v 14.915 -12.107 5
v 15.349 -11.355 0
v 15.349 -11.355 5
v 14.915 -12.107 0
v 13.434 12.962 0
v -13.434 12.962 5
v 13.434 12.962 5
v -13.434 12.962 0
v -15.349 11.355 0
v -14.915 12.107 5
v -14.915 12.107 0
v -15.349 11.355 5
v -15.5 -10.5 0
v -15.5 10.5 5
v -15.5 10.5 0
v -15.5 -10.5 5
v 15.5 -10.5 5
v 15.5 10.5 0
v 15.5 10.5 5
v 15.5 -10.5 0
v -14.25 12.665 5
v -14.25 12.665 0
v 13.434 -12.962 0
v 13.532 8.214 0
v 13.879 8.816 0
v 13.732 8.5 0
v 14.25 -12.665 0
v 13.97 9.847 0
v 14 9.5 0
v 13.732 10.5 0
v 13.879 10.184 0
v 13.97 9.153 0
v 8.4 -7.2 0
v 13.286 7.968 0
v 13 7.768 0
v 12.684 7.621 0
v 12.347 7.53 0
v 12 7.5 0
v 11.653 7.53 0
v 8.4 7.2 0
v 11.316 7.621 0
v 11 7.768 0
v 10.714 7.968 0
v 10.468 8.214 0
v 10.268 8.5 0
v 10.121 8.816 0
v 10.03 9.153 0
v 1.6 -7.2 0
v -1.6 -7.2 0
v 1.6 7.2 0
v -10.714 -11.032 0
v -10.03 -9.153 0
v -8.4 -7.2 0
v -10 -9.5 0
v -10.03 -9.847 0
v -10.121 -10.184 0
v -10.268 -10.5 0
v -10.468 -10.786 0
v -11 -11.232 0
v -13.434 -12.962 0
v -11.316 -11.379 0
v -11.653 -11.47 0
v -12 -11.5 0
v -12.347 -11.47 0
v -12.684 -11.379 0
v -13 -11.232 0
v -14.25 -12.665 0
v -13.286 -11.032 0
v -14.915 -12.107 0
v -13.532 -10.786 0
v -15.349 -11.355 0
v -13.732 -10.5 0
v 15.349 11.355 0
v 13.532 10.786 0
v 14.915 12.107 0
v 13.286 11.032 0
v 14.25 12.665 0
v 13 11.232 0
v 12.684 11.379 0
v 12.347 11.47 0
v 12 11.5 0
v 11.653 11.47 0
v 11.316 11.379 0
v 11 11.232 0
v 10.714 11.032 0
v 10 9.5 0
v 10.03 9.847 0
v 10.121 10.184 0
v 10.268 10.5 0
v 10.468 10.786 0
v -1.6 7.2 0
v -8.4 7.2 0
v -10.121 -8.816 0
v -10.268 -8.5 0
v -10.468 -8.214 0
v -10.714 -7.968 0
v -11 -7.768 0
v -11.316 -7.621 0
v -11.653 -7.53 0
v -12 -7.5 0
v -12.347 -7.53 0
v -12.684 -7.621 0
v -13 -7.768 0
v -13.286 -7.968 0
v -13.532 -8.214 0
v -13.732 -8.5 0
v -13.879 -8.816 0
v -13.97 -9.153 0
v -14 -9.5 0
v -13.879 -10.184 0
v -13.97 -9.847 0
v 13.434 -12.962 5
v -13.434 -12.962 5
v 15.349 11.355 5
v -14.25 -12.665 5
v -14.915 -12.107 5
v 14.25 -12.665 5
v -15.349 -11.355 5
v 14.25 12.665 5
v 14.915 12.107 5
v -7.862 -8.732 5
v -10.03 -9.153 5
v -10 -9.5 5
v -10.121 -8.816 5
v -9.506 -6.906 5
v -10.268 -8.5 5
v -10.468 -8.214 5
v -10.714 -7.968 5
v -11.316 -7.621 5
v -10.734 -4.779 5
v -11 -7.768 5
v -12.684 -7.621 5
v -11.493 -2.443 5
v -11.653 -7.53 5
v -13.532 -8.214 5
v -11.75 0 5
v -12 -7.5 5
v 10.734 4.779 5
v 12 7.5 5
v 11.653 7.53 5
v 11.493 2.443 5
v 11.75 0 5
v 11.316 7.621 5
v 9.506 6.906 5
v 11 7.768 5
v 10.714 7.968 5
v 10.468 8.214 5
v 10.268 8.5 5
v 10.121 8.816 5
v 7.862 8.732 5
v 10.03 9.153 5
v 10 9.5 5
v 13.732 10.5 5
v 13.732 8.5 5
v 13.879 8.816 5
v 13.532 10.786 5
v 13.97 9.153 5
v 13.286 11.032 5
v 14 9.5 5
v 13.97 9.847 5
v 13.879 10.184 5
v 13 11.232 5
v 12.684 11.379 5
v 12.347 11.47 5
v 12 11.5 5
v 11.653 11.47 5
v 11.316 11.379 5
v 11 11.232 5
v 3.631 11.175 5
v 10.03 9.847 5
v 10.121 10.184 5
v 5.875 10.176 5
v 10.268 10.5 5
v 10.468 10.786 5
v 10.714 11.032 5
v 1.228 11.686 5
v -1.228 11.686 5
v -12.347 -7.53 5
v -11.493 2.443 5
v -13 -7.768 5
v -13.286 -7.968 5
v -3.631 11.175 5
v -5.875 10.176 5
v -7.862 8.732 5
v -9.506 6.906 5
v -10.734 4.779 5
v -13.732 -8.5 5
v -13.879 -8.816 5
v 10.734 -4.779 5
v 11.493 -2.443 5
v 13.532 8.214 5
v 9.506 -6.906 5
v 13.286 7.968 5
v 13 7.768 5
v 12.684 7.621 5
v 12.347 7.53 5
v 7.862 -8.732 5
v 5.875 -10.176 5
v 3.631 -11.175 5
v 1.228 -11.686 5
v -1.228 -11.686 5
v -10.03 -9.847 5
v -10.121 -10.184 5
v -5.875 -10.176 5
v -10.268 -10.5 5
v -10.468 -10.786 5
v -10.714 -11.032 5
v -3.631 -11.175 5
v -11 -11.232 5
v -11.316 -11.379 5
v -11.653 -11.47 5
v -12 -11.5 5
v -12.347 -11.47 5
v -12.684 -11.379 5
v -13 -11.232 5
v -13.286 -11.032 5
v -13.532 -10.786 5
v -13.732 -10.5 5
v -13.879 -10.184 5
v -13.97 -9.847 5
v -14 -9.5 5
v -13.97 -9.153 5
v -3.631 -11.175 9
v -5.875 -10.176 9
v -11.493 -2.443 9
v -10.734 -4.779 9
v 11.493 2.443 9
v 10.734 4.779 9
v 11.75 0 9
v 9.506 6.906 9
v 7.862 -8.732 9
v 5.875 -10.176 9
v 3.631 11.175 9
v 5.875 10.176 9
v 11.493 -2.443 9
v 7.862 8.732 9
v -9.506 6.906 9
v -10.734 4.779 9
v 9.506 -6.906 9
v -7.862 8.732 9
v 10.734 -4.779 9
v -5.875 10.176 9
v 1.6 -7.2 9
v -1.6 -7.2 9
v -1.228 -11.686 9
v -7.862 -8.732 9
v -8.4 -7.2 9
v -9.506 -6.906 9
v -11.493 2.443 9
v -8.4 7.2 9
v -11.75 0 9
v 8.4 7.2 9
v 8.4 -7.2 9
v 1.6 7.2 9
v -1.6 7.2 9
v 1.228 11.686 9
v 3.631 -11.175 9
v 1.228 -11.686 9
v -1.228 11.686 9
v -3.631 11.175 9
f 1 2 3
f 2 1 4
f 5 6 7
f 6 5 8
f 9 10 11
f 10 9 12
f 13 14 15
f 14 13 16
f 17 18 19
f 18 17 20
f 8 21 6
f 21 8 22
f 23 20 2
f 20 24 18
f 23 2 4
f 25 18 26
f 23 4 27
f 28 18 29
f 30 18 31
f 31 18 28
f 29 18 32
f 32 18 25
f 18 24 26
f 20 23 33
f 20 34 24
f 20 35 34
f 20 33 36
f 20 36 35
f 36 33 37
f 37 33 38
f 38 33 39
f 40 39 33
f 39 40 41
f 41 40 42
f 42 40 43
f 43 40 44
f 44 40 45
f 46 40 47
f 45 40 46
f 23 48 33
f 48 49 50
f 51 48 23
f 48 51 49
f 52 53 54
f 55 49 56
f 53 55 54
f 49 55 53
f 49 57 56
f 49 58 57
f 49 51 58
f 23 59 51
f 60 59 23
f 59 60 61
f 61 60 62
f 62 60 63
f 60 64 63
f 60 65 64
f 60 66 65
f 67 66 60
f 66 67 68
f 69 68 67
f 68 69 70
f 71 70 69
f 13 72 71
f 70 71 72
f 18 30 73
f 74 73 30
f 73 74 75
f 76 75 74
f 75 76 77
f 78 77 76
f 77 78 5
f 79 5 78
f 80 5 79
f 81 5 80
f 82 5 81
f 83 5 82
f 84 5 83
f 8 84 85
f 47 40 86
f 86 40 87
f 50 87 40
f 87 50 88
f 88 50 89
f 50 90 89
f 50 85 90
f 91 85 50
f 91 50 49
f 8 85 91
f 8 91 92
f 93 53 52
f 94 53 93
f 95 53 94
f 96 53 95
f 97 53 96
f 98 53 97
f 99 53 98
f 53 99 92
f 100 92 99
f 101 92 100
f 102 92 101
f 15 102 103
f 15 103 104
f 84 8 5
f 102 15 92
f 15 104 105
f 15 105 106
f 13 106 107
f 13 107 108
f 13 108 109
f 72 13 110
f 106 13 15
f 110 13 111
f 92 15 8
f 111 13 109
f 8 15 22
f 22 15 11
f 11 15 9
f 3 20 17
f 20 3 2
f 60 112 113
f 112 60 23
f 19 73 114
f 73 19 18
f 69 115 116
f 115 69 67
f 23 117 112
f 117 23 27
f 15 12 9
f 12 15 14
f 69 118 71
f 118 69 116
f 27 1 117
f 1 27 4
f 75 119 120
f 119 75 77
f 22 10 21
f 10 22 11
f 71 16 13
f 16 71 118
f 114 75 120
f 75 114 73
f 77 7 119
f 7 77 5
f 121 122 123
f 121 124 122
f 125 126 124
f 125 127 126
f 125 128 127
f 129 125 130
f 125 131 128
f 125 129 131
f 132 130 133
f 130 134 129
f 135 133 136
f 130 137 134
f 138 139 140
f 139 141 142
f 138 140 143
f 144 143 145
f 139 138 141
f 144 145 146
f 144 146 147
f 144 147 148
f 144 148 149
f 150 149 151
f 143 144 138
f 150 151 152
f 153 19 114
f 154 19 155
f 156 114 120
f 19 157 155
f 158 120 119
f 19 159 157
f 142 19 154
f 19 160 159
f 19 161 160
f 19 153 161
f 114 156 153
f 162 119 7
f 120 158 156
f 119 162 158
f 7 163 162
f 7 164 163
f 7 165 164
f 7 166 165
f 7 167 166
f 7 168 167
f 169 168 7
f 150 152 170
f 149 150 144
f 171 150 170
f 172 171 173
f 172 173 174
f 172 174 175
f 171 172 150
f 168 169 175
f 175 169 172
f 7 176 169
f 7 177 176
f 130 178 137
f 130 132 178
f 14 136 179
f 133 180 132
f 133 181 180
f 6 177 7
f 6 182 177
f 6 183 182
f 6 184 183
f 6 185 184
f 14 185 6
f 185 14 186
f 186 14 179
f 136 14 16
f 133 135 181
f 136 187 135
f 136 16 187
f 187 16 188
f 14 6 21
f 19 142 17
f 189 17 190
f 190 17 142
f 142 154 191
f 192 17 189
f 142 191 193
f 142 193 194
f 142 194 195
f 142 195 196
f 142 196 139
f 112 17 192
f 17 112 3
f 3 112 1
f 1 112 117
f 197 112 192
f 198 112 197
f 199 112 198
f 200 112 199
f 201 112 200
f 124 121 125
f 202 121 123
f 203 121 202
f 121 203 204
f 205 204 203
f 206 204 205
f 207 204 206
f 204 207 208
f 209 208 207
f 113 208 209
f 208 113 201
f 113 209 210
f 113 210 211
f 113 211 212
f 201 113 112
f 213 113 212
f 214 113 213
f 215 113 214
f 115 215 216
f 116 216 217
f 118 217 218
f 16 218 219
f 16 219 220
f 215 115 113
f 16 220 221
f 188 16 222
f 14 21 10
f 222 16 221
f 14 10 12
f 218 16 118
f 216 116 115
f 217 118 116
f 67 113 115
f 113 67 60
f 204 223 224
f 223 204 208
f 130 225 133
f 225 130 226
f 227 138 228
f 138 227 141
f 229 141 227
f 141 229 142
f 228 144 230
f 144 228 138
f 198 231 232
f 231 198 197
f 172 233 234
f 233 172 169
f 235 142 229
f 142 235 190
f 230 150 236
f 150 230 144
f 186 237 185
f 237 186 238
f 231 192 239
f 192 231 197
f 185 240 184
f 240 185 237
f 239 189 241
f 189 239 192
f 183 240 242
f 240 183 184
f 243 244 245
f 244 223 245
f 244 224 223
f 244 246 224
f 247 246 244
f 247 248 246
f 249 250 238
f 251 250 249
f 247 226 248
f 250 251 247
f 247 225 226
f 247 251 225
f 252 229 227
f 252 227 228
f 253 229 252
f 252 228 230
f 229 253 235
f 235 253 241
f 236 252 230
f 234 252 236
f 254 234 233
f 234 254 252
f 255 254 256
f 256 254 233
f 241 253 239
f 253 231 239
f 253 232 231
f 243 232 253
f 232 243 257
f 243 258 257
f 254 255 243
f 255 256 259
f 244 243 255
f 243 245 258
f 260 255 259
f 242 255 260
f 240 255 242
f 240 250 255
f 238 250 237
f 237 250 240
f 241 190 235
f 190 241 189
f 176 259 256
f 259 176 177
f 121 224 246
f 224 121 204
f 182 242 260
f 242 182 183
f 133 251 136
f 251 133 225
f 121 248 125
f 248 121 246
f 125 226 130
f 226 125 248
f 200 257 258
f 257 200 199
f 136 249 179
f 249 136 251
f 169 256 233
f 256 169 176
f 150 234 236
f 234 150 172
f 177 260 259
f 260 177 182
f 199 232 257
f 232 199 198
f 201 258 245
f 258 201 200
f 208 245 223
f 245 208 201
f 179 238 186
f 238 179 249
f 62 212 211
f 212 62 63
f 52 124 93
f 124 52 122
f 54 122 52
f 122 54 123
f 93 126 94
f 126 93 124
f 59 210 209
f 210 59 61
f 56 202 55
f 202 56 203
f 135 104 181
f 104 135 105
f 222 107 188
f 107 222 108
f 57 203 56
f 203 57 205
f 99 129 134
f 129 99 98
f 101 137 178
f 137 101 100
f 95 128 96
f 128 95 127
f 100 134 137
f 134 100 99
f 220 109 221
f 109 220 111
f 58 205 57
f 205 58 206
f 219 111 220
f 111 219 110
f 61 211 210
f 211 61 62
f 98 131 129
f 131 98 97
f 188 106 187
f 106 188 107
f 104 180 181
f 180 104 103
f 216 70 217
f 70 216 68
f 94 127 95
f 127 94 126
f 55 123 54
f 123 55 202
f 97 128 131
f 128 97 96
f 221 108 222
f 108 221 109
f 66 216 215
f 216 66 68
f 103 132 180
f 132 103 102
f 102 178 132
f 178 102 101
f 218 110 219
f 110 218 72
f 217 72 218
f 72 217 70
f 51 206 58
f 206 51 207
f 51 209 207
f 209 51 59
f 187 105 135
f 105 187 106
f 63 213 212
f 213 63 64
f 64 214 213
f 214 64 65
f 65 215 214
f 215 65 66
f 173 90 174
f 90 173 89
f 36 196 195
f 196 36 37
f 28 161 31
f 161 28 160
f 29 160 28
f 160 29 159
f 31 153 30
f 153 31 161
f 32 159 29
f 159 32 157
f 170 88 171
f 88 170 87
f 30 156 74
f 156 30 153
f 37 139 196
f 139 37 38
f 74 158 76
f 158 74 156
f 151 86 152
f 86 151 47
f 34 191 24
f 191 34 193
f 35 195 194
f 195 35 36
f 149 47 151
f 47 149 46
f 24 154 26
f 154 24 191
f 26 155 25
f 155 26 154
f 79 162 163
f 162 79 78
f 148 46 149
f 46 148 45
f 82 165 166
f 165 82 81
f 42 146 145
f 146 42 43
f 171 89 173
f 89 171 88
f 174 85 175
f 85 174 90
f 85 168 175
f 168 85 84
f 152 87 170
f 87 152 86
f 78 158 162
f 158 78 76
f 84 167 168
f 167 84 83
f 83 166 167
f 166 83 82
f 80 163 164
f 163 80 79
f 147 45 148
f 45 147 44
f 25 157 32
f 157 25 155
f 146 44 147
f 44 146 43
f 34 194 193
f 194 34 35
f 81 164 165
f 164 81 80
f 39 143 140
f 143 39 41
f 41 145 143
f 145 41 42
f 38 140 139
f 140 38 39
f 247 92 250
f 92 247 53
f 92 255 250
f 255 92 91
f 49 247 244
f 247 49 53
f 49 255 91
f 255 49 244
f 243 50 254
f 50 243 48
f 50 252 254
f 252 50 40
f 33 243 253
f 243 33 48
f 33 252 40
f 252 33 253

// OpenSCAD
top = 1; // different top pieces 0-6
printParts = false; // lay out 3D-printed parts
showMirror = true;
showGrid = false;
showSocket = true;

//usbBackInlay(0); // USB Backside
usbMale(0); //double USB A socket
//translate([0,0,750+22+3]) columnPower();
//columnStabilizer(); // stabilaizer for frame, use projection(cut=false) before for lasercut version
//translate([0,0,12])columnCapitel();


// optional
//columnConnector(); // screw columns on walls instead of standing on ground
//columnCapitel1(); // alternative top for column


//just for checks
//translate([0,0,750+14]) column(); // simulate column with hull
//for(i=[0:2])                      // simulate frames
//    rotate([0,0,120*i]) 
//    translate([0,81.461-6,750/2]) 
//    cube([11.5,11.5,750],true); //19.5

module usbMale(holes) {
    difference() {
        union() {
            hull() for(i=[-1,1]) for(j=[-1,1]) 
                translate([(31-5)/2*i,(26-5)/2*j,0])
                cylinder(d=5,h=5,$fn=18);
            //translate([0,0,-10])cylinder(d=23.5,h=10);
            translate([0,0,5])cylinder(d=23.5,h=4);//h 2.5
        }
        for(i=[-1,1])
            translate([24/2*i,19/2*i,0]) 
            cylinder(d=4,h=30,$fn=36,center=true);
//        for(i=[-1,1])
//            translate([0,i*5,-12]) cube([14.5,6.5,100],true);
        for(i=[-1,1])
            translate([i*5,0,0]) 
            hull() {
                translate([0,0,0]) cube([6.8,14.4,30],true);
                
                //translate([0,0,-10]) cube([7,14.5,20],true);
            }
    }
    if (holes==1)
        for(i=[-1,1])
        translate([24/2*i,19/2*i,0]) 
        cylinder(d=3.4,h=30,$fn=36,center=true);
}

module columnConnector() {
    difference() {
        union() {
            intersection() {
                hull() for(i=[0:1]) {
                    rotate([0,0,120*i+30]) 
                        translate([0,81.461-6,-50/2]) 
                        cube([11.5,11.5,50],true); //19.5
                }
                hull() {
                    translate([0,0,-6])
                        cube([150,150,12],true);
                    translate([0,0,-12.5])
                        cube([200,50,25],true);
                }

            }
        }
        for(i=[0:2]) 
            rotate([0,0,120*i+30]) 
            translate([0,81.461-6,-11.5/2]) 
            cylinder(d=5.5,h=100,$fn=36,center=true);
        for(i=[0:2]) 
            rotate([0,0,120*i+30]) 
            translate([0,81.461-6,-100-12]) 
            cylinder(d=9,h=100,$fn=36);
        translate([0,0,-12.5])
            rotate([0,90,0]) 
            cylinder(d=14,h=100,center=true);
        for(i=[-1,1])
            translate([0,25*i,-12.5])
                hull() {
                    translate([0,0,-2])
                        rotate([0,90,0]) 
                        cylinder(d=2,h=100,center=true);
                    translate([0,0,2])
                        rotate([0,90,0]) 
                        cylinder(d=2,h=100,center=true);
                }
    }
}

module usbBackInlay (holes) {
    difference() {
        union() {
            hull() for(i=[-1,1]) for(j=[-1,1]) 
                translate([(31-5)/2*i,(26-5)/2*j,0])
                cylinder(d=5,h=2,$fn=18);
            translate([0,0,-8])cylinder(d=22,h=8);
            //translate([0,0,2])cylinder(d=23.5,h=2.5);
        }
        
        for(i=[-1,1]) for(j=[-1,1])
            translate([10*i,3.5*j,0]) 
            cylinder(d=4,h=30,$fn=36,center=true);
        
        for(j=[-1,1])
            translate([0,3.5*j,-10]) 
            cube([400,4,10],true);
        
        for(i=[-1,1]) //for(j=[-1,1])
            translate([24/2*i,-19/2*i,0]) 
            cylinder(d=3.4,h=30,$fn=36,center=true);
//        translate([0,0,3]) cube([14.5,6.5,8],true);
//        hull() {
//            translate([0,0,-9]) cube([14.5,6.5,20],true);
//            translate([0,0,-11]) cube([20,10.5,20],true);
//        }
    }
    if (holes==1)
        for(i=[-1,1]) //for(j=[-1,1])
        translate([24/2*i,19/2*i,0]) 
        cylinder(d=3.4,h=30,$fn=36,center=true);
}
module columnCapitel() {
    difference() {
        union() {
            hull() {
                for(i=[0:2]) 
                    rotate([0,0,120*i]) 
                    translate([0,81.461-6,-5+1]) 
                    cube([11.5+8.5,11.5+8.5,14],true); //19.5
            
            }
//            for(i=[0:2]) hull() {
//                translate([0,0,60]) rotate([0,0,30]) cylinder(d=15,h=1,$fn=3);
//                rotate([0,0,120*i]) 
//                    translate([0,81.461-6+2,3]) 
//                    cube([11.5,11.5,1],true); //19.5
//            }
        }
        for(i=[0:2]) 
            rotate([0,0,120*i]) 
            translate([0,81.461-6,-11]) 
            cylinder(d=5.5,h=100,center=true,$fn=36);
        for(i=[0:2]) 
            rotate([0,0,120*i]) 
            translate([0,81.461-6,13-5]) 
            cylinder(d=10,h=20,center=true,$fn=36);
        difference() {
            hull() for(i=[0:2]) 
                rotate([0,0,120*i]) 
                translate([0,81.461-6,-5-4]) 
                cube([11.5+5.5,11.5+5.5,16],true); //27.5
            hull() for(i=[0:2]) 
                rotate([0,0,120*i]) 
                translate([0,81.461-6,-5-4]) 
                cube([11.5,11.5,16],true); //27.5
        }
        
        hull() for(i=[0:2]) rotate([0,0,120*i]) translate([0,81.461-6-15,-4]) cylinder(d=15,h=14, center=true);
    }
}

module columnCapitel1() {
    difference() {
        union() {
            translate([0,0,-121.67])
                rotate([0,0,30])
                cylinder(d=13.3,h=11.5,$fn=3);
            difference() {
                hull() for(i=[0:2]) 
                    rotate([0,0,120*i]) 
                    translate([0,81.461-6,-11.5/2]) 
                    cube([11.5,11.5,11.5],true); //19.5
                hull() for(i=[0:2]) 
                    rotate([0,0,120*i]) 
                    translate([0,81.461-6-11.5-2,-11.5/2]) 
                    cube([0.5,11.5,20],true); //19.5
            }
            //rotate([0,180,0])
            for(i=[0:2]) 
                translate([0,0,-11.5])
                rotate([0,0,120*i]) 
                translate([0,81.461-6+11.5/2,0]) 
                rotate([-35.26,0,0])
                translate([0,-11.5/2,-134.912/2]) 
    cube([11.5,11.5,134.912],true);
        }

        for(i=[0:2]) 
            rotate([0,0,120*i]) 
            translate([0,81.461-6,-11.5/2]) 
            cylinder(d=5.5,h=100,$fn=36,center=true);
        
        for(i=[0:2]) 
            rotate([0,0,120*i]) 
            translate([0,81.461-6,-18]) 
            cylinder(d=8,h=20,$fn=36,center=true);
    }
}

module columnPower() {  
    reduceHeight = 2;
    difference() {
        hull() for(i=[0:2]) 
            rotate([0,0,120*i]) 
            translate([0,81.461-6,-11+reduceHeight/2]) 
            cube([11.5+8.5,11.5+8.5,38-3-reduceHeight],true);
        for(i=[0:2]) 
            rotate([0,0,120*i]) 
            translate([0,81.461-6,-11]) 
            cylinder(d=5.5,h=100,center=true);
        for(i=[0:2]) 
            rotate([0,0,120*i]) 
            translate([0,81.461-6,-6.5]) 
            cylinder(d=9.5,h=26,$fn=6,center=true);
        difference() {
            hull() for(i=[0:2]) 
                rotate([0,0,120*i]) 
                translate([0,81.461-6-12,-11+4]) 
                cube([11.5,11.5,38-3],true);
            translate([0,-500,500+2]) cube([1000,1000,1000],true);
            translate([0,0,500+2]) cube([20,1000,1000],true);
        }
        hull() for(i=[0:2]) 
                rotate([0,0,120*i]) 
                translate([0,81.461-6,-11-38+1+4+reduceHeight]) 
                cube([11.5,11.5,38+2],true);
        for(i=[1:2]) 
            translate([0,15,0]) rotate([0,0,120*i]) 
            translate([0,-45.6-6,-11+4]) 
            rotate([90,0,0]) 
            speakonMale(1);
        difference() {
            hull() for(i=[0:2]) 
                rotate([0,0,120*i]) 
                translate([0,81.461-6,-11-4-24+reduceHeight]) 
                cube([11.5+5.5,11.5+5.5,38],true); //27.5
            hull() for(i=[0:2]) 
                rotate([0,0,120*i]) 
                translate([0,81.461-6,-11-4-24+reduceHeight]) 
                cube([11.5,11.5,38],true); //27.5
        }
        hull() {
            translate([-0,-20,-7]) cube([65,59,23],true);
            translate([-0,-17,-10]) cube([65,59,23],true);
        }
        translate([-0,-17,-15]) cube([65,57,23],true);
        
    }
    for(i=[-1,1]) translate([i*54/2,-17,4.5-5]) cylinder(d=6,h=5,$fn=18);
//    for(i=[0:2]) 
//        translate([0,15,0]) rotate([0,0,120*i]) 
//        translate([0,-45.6-6,-11+4]) 
//        rotate([90,0,0]) 
//        speakonMale(1);    
}

module speakonMale(holes) {
    difference() {
        union() {
            hull() for(i=[-1,1]) for(j=[-1,1]) 
                translate([(31-5)/2*i,(26-5)/2*j,0])
                cylinder(d=5,h=4.5,$fn=18);
            translate([0,0,-28.1])cylinder(d=24,h=28.1);
            translate([0,0,4.5])cylinder(d=24,h=2.5);
        }
        for(i=[-1,1]) //for(j=[-1,1])
            translate([24/2*i,19/2*i,0]) 
            cylinder(d=3.4,h=30,$fn=36,center=true);
    }
    if (holes==1)
        for(i=[-1,1]) //for(j=[-1,1])
        translate([24/2*i,19/2*i,0]) 
        cylinder(d=3.4,h=50,$fn=36,center=true);
}
module columnStabilizer() {
    difference() {
        hull() for(i=[0:2]) rotate([0,0,120*i]) translate([0,81.461-6,-11]) cube([11.5,11.5,4],true);
        for(i=[0:2]) rotate([0,0,120*i]) translate([0,81.461-6,-11]) cylinder(d=5.5,h=100,center=true);
        hull() for(i=[0:2]) rotate([0,0,120*i]) translate([0,81.461-6-15,-11]) cylinder(d=15,h=100, center=true);
    }
}

module columnSocket() {
    hull() for(i=[0:3]) rotate([0,0,120*i+30]) translate([0,0,-50+6]) cube([258.653,448,12],true);
    hull() for(i=[0:3]) rotate([0,0,120*i]) translate([0,0,-25]) cube([173.205,100,50],true);
}

module column() {
    hull() for(i=[0:2]) rotate([0,0,120*i]) translate([0,81.461-6,-750/2]) cube([11.5,11.5,750],true);
}
